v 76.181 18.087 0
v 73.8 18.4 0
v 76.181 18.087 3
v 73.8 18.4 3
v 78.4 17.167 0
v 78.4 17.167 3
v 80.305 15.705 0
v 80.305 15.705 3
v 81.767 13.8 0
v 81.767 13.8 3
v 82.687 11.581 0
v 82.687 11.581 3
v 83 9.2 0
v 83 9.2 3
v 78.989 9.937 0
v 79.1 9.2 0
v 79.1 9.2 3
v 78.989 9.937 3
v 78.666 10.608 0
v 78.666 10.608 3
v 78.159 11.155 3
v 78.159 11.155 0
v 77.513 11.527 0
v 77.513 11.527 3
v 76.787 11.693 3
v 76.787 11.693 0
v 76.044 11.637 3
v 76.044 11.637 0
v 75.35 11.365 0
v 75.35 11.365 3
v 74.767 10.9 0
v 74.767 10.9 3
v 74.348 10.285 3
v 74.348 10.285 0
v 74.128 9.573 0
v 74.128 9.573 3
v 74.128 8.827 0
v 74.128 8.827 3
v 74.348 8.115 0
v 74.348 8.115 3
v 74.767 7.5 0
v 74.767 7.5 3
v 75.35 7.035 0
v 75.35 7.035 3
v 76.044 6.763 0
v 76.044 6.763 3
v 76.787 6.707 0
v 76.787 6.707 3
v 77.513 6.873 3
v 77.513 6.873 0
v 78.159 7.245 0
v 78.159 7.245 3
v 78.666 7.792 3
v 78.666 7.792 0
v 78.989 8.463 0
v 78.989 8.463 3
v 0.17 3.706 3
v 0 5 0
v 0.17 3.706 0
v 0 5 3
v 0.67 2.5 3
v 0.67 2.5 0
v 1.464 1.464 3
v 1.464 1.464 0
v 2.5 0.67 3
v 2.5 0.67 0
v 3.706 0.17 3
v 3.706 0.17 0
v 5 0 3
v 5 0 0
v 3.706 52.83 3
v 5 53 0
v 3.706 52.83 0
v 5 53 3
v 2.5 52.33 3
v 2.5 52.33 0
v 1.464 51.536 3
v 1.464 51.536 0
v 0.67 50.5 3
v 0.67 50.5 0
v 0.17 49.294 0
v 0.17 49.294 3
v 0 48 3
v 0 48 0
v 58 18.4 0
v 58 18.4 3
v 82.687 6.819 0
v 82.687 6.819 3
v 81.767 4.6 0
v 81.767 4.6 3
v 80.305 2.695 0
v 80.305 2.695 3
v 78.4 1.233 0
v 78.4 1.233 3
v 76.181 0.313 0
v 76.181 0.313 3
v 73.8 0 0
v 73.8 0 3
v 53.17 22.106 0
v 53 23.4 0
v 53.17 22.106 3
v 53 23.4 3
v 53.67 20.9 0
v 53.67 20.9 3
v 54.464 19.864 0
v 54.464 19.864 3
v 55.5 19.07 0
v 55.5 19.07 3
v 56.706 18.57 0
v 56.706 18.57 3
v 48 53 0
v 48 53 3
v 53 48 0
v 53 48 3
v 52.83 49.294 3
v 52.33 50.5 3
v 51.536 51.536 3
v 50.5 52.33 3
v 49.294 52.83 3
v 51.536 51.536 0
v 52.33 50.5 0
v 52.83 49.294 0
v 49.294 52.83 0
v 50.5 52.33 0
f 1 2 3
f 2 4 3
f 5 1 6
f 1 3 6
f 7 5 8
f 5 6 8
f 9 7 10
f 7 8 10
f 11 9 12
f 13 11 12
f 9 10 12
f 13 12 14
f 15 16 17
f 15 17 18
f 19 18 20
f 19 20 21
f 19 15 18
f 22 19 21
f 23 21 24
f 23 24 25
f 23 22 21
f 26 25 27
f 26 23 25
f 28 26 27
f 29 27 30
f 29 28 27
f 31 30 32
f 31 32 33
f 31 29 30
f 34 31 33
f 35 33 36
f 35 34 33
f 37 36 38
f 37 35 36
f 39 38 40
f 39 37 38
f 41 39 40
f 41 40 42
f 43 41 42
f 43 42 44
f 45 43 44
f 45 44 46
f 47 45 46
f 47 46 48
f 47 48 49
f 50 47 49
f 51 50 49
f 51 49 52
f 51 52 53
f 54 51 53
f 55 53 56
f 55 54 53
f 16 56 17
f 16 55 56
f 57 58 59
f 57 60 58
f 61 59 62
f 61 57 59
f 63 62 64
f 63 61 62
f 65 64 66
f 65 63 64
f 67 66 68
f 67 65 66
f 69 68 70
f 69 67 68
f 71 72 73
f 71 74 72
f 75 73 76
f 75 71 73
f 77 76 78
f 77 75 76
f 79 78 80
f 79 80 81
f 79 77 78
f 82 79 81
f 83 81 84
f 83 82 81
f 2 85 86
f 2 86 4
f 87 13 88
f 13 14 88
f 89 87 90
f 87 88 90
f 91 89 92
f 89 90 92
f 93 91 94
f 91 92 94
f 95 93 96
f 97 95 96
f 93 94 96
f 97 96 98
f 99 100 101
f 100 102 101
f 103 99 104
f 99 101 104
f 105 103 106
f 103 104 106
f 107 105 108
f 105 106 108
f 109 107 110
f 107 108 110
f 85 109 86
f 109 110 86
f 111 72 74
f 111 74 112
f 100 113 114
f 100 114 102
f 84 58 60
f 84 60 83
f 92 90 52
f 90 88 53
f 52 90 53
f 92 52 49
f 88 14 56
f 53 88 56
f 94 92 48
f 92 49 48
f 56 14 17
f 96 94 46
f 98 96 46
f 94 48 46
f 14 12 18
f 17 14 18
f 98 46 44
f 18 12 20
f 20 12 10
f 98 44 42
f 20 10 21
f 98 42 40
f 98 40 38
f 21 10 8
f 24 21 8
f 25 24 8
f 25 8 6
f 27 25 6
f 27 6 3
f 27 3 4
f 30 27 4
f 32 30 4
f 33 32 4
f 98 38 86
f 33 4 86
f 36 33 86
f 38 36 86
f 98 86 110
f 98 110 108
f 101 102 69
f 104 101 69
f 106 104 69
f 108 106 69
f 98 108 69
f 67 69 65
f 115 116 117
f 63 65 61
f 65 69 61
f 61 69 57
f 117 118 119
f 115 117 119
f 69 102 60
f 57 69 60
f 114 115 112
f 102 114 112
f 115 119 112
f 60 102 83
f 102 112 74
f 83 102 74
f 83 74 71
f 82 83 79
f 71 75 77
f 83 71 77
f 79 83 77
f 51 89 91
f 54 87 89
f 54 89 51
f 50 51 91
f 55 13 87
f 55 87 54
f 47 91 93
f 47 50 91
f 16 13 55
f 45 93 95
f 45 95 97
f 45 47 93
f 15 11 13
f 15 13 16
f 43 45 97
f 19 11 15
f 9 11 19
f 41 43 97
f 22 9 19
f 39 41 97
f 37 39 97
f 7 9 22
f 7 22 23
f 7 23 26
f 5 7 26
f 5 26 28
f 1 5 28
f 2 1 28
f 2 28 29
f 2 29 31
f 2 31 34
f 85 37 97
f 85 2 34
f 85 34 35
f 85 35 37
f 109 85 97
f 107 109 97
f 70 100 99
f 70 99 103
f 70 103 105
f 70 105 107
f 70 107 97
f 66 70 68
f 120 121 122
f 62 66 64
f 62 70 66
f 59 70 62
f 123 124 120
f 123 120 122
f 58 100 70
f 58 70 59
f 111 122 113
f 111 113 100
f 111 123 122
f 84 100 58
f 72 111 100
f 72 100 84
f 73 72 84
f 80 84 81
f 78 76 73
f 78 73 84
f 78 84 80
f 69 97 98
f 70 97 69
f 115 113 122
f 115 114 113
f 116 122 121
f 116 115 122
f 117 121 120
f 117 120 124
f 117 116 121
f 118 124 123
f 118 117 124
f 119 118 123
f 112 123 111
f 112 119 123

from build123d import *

# Parameters (mm, degrees)
SKETCH1_R           = 2.5
BOSS_EXTRUDE1_DEPTH = 3
FILLET1_R           = 5
FILLET2_R           = 5
FILLET4_R           = 9.2


with BuildPart() as part:
    # Sketch1 → Boss-Extrude1 (new body)
    with BuildSketch(Plane.XY):
        Polygon((53, 53), (53, 18.4), (83, 18.4), (83, 0), (0, 0), (0, 53), align=None)
        with Locations((76.6, 9.2)):
            Circle(SKETCH1_R, mode=Mode.SUBTRACT)
    extrude(amount=BOSS_EXTRUDE1_DEPTH)

    # Fillet1
    fillet1_edges = [part.edges().sort_by_distance(p)[0] for p in [
        (0, 53, 1.5),
        (53, 53, 1.5),
        (0, 0, 1.5),
    ]]
    fillet(fillet1_edges, radius=FILLET1_R)

    # Fillet2
    fillet2_edges = [part.edges().sort_by_distance(p)[0] for p in [
        (53, 18.4, 1.5),
    ]]
    fillet(fillet2_edges, radius=FILLET2_R)

    # Fillet4
    fillet4_edges = [part.edges().sort_by_distance(p)[0] for p in [
        (83, 0, 1.5),
        (83, 18.4, 1.5),
    ]]
    fillet(fillet4_edges, radius=FILLET4_R - 0.0001)  # a hair under: the kernel refuses the full size


solid = part.part
